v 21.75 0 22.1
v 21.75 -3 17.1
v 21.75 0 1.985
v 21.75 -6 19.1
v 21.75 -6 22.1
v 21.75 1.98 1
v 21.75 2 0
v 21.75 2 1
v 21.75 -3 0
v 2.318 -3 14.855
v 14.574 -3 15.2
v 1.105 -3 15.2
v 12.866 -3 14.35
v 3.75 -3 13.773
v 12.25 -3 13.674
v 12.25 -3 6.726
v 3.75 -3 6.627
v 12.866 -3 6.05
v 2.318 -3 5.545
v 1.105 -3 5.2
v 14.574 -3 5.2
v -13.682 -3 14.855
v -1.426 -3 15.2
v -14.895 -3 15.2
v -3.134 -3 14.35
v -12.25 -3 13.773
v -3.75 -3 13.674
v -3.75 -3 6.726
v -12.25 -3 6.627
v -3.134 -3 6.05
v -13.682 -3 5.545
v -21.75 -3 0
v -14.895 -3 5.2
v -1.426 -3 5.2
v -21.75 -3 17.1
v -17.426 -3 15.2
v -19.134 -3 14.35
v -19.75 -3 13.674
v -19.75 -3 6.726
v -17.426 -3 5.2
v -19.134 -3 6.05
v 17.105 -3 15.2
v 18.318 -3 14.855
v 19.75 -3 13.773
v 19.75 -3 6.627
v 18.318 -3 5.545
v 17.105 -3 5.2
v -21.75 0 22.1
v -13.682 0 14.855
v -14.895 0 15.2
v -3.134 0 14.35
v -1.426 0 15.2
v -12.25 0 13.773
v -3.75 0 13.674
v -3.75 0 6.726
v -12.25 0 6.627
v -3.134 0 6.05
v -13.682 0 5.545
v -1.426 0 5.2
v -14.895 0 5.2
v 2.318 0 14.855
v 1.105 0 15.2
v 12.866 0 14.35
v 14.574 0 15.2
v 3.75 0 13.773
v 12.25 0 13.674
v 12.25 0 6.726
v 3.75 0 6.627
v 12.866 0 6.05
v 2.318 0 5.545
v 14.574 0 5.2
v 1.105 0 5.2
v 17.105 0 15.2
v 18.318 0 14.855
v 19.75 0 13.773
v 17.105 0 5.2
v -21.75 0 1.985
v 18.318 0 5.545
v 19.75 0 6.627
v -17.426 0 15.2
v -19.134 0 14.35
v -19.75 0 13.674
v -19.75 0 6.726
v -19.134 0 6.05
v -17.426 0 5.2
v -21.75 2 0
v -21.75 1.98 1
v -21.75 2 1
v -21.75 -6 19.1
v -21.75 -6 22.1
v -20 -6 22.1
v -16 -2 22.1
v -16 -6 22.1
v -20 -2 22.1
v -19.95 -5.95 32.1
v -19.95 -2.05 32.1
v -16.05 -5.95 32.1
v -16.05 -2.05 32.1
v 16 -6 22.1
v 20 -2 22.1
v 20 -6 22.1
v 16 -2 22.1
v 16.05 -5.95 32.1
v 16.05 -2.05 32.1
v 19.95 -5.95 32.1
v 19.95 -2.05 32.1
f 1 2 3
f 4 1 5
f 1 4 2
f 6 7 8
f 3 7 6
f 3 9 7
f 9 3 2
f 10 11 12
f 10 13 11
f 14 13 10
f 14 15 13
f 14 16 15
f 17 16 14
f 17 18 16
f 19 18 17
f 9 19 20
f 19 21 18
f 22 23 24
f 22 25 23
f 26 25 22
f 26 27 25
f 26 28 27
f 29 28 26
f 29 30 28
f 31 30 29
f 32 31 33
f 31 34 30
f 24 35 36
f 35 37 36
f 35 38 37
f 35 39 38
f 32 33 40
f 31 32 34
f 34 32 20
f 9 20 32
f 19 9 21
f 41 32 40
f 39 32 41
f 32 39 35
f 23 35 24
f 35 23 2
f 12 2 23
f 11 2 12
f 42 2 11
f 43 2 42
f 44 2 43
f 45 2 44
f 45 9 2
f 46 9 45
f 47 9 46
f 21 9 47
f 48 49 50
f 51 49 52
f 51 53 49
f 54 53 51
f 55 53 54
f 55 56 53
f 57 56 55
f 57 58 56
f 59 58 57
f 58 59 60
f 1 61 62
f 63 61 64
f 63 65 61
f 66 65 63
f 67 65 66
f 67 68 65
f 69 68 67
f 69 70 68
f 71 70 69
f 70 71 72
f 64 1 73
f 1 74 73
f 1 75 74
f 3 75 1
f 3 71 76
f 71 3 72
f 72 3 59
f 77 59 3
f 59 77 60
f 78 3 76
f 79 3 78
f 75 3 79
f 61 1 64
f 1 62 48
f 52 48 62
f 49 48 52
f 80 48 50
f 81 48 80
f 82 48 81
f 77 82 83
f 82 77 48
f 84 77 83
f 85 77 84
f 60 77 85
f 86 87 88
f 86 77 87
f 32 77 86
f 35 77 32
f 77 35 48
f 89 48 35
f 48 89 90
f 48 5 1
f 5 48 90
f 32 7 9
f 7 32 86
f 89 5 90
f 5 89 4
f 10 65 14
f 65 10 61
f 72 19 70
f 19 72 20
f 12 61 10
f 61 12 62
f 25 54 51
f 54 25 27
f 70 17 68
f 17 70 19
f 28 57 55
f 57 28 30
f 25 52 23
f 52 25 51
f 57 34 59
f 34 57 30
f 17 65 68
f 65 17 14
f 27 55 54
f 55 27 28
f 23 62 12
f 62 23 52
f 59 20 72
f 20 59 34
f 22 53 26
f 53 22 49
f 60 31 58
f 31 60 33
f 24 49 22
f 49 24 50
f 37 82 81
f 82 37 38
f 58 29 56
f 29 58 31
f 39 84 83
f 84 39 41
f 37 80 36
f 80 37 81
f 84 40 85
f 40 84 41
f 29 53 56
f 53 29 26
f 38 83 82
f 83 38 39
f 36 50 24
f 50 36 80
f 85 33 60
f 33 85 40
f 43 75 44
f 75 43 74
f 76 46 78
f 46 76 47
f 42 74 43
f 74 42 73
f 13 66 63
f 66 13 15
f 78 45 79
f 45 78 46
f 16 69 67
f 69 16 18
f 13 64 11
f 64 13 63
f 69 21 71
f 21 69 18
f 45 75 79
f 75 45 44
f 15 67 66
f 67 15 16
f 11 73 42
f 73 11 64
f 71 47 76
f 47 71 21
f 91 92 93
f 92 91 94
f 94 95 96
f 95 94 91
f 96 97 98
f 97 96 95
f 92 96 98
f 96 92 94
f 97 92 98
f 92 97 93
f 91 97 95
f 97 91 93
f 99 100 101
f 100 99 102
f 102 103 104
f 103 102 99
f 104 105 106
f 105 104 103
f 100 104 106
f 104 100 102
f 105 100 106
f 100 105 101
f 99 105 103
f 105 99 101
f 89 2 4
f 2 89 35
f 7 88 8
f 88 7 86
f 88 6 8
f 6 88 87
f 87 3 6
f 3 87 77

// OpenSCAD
// Kivinen original 0,1
// hsu patches, better printability.
rampshift=2;
rampwidth=0;
supportplatey=1;
supportplatez=2;

module triangle(x,y,z,mode) {
  if (mode==0) {
    translate([0,y,0]) rotate([90,0,0]) linear_extrude(height=y) polygon(points=[[0,0],[x,z],[x,0]]);
  } else if (mode==1) {
    translate([0,y,0]) rotate([90,0,0]) linear_extrude(height=y) polygon(points=[[0,0],[0,z],[x,z]]);
  } else if (mode==2) {
    translate([0,y,0]) rotate([90,0,0]) linear_extrude(height=y) polygon(points=[[0,0],[0,z],[x,0]]);
  } else if (mode==3) {
    translate([0,y,0]) rotate([90,0,0]) linear_extrude(height=y) polygon(points=[[0,z],[x,z],[x,0]]);
  } else if (mode==4) {
    translate([x,0,0]) rotate([0,0,90]) linear_extrude(height=z) polygon(points=[[0,0],[y,x],[y,0]]);
  } else if (mode==5) {
    translate([x,0,0]) rotate([0,0,90]) linear_extrude(height=z) polygon(points=[[0,0],[0,x],[y,x]]);
  } else if (mode==6) {
    translate([x,0,0]) rotate([0,0,90]) linear_extrude(height=z) polygon(points=[[0,0],[0,x],[y,0]]);
  } else if (mode==7) {
    translate([x,0,0]) rotate([0,0,90]) linear_extrude(height=z) polygon(points=[[0,x],[y,x],[y,0]]);
  } else if (mode==8) {
    translate([0,0,z]) rotate([0,90,0]) linear_extrude(height=x) polygon(points=[[0,0],[z,y],[z,0]]);
  } else if (mode==9) {
    translate([0,0,z]) rotate([0,90,0]) linear_extrude(height=x) polygon(points=[[0,0],[0,y],[z,y]]);
  } else if (mode==10) {
    translate([0,0,z]) rotate([0,90,0]) linear_extrude(height=x) polygon(points=[[0,0],[0,y],[z,0]]);
  } else if (mode==11) {
    translate([0,0,z]) rotate([0,90,0]) linear_extrude(height=x) polygon(points=[[0,y],[z,y],[z,0]]);
  }
}

// One hole for the screws
module hole() {
  color("Blue")
    intersection() {
      cylinder(h=6, r=10.4/2, center=true);
      cube([7.5, 10, 7], center=true);
    }
}

// Set of 3 holes
module holes() {
  translate([43.5/2, 5+10.4/2, 2]) 
  union() {
    translate([-16, 0, 0]) hole();
    translate([+16, 0, 0]) hole();
    hole();
  }
}

// The rectangular cone, one quarter
module conepiece() {
  color("Green")
  linear_extrude(height = 10, center=true, scale=3.9/4)
  square(2);
}

// Half cone
module conehalf() {
  union() {
    mirror([1,0,0]) conepiece();
    conepiece();
  }
}

// Full cone
module cone() {
  rotate(-90, [1, 0, 0])
  union() {
    conehalf();
    rotate(180, [0, 0, 1]) conehalf();
  }
}

module ramp() {
  color("Yellow")
    translate([0, 32.1-10-3-rampshift, 3])
    rotate(90, [0, 0, 1])
    rotate(90, [1, 0, 0])
    // In original piece this was 40mm, but make printing easier
    // I extended it to full length (i.e. +3.5 was added because of that).
    linear_extrude(height=40+3.5, center=true)
    // Original piece was 3 mm x 2 mm ramp, but changed to 3mm x 3mm to
    // mke printing easier bu adding -1 to first point
      polygon([[0-rampwidth, 0], [2, 3], [2, 0]]);
}

module base() {
  color("red")
  union() {
    cube([43.5, 32.1-10, 3]);
    translate([0, 32.1-10-1-rampshift, 0]) cube([43.5, 1+rampshift, 6]);
  }
}

module base2() {
  translate([-43.5/2, 0, 0])
  difference() {
    base();
    holes();
  }
}

module piece() {
  base2();
  translate([-20+2, 32.1-10+5, 4]) cone();
  translate([20-2, 32.1-10+5, 4]) cone();
}

module rakkikiinnike() {
  ramp();
  piece();
  translate([-43.5/2,0,-supportplatez]) cube([43.5,supportplatey,supportplatez+0.01]);
  translate([-43.5/2,supportplatey-0.01,-supportplatez]) triangle(43.5,supportplatey,supportplatez+0.01,10);
}

rotate([90,0,0]) rakkikiinnike();
